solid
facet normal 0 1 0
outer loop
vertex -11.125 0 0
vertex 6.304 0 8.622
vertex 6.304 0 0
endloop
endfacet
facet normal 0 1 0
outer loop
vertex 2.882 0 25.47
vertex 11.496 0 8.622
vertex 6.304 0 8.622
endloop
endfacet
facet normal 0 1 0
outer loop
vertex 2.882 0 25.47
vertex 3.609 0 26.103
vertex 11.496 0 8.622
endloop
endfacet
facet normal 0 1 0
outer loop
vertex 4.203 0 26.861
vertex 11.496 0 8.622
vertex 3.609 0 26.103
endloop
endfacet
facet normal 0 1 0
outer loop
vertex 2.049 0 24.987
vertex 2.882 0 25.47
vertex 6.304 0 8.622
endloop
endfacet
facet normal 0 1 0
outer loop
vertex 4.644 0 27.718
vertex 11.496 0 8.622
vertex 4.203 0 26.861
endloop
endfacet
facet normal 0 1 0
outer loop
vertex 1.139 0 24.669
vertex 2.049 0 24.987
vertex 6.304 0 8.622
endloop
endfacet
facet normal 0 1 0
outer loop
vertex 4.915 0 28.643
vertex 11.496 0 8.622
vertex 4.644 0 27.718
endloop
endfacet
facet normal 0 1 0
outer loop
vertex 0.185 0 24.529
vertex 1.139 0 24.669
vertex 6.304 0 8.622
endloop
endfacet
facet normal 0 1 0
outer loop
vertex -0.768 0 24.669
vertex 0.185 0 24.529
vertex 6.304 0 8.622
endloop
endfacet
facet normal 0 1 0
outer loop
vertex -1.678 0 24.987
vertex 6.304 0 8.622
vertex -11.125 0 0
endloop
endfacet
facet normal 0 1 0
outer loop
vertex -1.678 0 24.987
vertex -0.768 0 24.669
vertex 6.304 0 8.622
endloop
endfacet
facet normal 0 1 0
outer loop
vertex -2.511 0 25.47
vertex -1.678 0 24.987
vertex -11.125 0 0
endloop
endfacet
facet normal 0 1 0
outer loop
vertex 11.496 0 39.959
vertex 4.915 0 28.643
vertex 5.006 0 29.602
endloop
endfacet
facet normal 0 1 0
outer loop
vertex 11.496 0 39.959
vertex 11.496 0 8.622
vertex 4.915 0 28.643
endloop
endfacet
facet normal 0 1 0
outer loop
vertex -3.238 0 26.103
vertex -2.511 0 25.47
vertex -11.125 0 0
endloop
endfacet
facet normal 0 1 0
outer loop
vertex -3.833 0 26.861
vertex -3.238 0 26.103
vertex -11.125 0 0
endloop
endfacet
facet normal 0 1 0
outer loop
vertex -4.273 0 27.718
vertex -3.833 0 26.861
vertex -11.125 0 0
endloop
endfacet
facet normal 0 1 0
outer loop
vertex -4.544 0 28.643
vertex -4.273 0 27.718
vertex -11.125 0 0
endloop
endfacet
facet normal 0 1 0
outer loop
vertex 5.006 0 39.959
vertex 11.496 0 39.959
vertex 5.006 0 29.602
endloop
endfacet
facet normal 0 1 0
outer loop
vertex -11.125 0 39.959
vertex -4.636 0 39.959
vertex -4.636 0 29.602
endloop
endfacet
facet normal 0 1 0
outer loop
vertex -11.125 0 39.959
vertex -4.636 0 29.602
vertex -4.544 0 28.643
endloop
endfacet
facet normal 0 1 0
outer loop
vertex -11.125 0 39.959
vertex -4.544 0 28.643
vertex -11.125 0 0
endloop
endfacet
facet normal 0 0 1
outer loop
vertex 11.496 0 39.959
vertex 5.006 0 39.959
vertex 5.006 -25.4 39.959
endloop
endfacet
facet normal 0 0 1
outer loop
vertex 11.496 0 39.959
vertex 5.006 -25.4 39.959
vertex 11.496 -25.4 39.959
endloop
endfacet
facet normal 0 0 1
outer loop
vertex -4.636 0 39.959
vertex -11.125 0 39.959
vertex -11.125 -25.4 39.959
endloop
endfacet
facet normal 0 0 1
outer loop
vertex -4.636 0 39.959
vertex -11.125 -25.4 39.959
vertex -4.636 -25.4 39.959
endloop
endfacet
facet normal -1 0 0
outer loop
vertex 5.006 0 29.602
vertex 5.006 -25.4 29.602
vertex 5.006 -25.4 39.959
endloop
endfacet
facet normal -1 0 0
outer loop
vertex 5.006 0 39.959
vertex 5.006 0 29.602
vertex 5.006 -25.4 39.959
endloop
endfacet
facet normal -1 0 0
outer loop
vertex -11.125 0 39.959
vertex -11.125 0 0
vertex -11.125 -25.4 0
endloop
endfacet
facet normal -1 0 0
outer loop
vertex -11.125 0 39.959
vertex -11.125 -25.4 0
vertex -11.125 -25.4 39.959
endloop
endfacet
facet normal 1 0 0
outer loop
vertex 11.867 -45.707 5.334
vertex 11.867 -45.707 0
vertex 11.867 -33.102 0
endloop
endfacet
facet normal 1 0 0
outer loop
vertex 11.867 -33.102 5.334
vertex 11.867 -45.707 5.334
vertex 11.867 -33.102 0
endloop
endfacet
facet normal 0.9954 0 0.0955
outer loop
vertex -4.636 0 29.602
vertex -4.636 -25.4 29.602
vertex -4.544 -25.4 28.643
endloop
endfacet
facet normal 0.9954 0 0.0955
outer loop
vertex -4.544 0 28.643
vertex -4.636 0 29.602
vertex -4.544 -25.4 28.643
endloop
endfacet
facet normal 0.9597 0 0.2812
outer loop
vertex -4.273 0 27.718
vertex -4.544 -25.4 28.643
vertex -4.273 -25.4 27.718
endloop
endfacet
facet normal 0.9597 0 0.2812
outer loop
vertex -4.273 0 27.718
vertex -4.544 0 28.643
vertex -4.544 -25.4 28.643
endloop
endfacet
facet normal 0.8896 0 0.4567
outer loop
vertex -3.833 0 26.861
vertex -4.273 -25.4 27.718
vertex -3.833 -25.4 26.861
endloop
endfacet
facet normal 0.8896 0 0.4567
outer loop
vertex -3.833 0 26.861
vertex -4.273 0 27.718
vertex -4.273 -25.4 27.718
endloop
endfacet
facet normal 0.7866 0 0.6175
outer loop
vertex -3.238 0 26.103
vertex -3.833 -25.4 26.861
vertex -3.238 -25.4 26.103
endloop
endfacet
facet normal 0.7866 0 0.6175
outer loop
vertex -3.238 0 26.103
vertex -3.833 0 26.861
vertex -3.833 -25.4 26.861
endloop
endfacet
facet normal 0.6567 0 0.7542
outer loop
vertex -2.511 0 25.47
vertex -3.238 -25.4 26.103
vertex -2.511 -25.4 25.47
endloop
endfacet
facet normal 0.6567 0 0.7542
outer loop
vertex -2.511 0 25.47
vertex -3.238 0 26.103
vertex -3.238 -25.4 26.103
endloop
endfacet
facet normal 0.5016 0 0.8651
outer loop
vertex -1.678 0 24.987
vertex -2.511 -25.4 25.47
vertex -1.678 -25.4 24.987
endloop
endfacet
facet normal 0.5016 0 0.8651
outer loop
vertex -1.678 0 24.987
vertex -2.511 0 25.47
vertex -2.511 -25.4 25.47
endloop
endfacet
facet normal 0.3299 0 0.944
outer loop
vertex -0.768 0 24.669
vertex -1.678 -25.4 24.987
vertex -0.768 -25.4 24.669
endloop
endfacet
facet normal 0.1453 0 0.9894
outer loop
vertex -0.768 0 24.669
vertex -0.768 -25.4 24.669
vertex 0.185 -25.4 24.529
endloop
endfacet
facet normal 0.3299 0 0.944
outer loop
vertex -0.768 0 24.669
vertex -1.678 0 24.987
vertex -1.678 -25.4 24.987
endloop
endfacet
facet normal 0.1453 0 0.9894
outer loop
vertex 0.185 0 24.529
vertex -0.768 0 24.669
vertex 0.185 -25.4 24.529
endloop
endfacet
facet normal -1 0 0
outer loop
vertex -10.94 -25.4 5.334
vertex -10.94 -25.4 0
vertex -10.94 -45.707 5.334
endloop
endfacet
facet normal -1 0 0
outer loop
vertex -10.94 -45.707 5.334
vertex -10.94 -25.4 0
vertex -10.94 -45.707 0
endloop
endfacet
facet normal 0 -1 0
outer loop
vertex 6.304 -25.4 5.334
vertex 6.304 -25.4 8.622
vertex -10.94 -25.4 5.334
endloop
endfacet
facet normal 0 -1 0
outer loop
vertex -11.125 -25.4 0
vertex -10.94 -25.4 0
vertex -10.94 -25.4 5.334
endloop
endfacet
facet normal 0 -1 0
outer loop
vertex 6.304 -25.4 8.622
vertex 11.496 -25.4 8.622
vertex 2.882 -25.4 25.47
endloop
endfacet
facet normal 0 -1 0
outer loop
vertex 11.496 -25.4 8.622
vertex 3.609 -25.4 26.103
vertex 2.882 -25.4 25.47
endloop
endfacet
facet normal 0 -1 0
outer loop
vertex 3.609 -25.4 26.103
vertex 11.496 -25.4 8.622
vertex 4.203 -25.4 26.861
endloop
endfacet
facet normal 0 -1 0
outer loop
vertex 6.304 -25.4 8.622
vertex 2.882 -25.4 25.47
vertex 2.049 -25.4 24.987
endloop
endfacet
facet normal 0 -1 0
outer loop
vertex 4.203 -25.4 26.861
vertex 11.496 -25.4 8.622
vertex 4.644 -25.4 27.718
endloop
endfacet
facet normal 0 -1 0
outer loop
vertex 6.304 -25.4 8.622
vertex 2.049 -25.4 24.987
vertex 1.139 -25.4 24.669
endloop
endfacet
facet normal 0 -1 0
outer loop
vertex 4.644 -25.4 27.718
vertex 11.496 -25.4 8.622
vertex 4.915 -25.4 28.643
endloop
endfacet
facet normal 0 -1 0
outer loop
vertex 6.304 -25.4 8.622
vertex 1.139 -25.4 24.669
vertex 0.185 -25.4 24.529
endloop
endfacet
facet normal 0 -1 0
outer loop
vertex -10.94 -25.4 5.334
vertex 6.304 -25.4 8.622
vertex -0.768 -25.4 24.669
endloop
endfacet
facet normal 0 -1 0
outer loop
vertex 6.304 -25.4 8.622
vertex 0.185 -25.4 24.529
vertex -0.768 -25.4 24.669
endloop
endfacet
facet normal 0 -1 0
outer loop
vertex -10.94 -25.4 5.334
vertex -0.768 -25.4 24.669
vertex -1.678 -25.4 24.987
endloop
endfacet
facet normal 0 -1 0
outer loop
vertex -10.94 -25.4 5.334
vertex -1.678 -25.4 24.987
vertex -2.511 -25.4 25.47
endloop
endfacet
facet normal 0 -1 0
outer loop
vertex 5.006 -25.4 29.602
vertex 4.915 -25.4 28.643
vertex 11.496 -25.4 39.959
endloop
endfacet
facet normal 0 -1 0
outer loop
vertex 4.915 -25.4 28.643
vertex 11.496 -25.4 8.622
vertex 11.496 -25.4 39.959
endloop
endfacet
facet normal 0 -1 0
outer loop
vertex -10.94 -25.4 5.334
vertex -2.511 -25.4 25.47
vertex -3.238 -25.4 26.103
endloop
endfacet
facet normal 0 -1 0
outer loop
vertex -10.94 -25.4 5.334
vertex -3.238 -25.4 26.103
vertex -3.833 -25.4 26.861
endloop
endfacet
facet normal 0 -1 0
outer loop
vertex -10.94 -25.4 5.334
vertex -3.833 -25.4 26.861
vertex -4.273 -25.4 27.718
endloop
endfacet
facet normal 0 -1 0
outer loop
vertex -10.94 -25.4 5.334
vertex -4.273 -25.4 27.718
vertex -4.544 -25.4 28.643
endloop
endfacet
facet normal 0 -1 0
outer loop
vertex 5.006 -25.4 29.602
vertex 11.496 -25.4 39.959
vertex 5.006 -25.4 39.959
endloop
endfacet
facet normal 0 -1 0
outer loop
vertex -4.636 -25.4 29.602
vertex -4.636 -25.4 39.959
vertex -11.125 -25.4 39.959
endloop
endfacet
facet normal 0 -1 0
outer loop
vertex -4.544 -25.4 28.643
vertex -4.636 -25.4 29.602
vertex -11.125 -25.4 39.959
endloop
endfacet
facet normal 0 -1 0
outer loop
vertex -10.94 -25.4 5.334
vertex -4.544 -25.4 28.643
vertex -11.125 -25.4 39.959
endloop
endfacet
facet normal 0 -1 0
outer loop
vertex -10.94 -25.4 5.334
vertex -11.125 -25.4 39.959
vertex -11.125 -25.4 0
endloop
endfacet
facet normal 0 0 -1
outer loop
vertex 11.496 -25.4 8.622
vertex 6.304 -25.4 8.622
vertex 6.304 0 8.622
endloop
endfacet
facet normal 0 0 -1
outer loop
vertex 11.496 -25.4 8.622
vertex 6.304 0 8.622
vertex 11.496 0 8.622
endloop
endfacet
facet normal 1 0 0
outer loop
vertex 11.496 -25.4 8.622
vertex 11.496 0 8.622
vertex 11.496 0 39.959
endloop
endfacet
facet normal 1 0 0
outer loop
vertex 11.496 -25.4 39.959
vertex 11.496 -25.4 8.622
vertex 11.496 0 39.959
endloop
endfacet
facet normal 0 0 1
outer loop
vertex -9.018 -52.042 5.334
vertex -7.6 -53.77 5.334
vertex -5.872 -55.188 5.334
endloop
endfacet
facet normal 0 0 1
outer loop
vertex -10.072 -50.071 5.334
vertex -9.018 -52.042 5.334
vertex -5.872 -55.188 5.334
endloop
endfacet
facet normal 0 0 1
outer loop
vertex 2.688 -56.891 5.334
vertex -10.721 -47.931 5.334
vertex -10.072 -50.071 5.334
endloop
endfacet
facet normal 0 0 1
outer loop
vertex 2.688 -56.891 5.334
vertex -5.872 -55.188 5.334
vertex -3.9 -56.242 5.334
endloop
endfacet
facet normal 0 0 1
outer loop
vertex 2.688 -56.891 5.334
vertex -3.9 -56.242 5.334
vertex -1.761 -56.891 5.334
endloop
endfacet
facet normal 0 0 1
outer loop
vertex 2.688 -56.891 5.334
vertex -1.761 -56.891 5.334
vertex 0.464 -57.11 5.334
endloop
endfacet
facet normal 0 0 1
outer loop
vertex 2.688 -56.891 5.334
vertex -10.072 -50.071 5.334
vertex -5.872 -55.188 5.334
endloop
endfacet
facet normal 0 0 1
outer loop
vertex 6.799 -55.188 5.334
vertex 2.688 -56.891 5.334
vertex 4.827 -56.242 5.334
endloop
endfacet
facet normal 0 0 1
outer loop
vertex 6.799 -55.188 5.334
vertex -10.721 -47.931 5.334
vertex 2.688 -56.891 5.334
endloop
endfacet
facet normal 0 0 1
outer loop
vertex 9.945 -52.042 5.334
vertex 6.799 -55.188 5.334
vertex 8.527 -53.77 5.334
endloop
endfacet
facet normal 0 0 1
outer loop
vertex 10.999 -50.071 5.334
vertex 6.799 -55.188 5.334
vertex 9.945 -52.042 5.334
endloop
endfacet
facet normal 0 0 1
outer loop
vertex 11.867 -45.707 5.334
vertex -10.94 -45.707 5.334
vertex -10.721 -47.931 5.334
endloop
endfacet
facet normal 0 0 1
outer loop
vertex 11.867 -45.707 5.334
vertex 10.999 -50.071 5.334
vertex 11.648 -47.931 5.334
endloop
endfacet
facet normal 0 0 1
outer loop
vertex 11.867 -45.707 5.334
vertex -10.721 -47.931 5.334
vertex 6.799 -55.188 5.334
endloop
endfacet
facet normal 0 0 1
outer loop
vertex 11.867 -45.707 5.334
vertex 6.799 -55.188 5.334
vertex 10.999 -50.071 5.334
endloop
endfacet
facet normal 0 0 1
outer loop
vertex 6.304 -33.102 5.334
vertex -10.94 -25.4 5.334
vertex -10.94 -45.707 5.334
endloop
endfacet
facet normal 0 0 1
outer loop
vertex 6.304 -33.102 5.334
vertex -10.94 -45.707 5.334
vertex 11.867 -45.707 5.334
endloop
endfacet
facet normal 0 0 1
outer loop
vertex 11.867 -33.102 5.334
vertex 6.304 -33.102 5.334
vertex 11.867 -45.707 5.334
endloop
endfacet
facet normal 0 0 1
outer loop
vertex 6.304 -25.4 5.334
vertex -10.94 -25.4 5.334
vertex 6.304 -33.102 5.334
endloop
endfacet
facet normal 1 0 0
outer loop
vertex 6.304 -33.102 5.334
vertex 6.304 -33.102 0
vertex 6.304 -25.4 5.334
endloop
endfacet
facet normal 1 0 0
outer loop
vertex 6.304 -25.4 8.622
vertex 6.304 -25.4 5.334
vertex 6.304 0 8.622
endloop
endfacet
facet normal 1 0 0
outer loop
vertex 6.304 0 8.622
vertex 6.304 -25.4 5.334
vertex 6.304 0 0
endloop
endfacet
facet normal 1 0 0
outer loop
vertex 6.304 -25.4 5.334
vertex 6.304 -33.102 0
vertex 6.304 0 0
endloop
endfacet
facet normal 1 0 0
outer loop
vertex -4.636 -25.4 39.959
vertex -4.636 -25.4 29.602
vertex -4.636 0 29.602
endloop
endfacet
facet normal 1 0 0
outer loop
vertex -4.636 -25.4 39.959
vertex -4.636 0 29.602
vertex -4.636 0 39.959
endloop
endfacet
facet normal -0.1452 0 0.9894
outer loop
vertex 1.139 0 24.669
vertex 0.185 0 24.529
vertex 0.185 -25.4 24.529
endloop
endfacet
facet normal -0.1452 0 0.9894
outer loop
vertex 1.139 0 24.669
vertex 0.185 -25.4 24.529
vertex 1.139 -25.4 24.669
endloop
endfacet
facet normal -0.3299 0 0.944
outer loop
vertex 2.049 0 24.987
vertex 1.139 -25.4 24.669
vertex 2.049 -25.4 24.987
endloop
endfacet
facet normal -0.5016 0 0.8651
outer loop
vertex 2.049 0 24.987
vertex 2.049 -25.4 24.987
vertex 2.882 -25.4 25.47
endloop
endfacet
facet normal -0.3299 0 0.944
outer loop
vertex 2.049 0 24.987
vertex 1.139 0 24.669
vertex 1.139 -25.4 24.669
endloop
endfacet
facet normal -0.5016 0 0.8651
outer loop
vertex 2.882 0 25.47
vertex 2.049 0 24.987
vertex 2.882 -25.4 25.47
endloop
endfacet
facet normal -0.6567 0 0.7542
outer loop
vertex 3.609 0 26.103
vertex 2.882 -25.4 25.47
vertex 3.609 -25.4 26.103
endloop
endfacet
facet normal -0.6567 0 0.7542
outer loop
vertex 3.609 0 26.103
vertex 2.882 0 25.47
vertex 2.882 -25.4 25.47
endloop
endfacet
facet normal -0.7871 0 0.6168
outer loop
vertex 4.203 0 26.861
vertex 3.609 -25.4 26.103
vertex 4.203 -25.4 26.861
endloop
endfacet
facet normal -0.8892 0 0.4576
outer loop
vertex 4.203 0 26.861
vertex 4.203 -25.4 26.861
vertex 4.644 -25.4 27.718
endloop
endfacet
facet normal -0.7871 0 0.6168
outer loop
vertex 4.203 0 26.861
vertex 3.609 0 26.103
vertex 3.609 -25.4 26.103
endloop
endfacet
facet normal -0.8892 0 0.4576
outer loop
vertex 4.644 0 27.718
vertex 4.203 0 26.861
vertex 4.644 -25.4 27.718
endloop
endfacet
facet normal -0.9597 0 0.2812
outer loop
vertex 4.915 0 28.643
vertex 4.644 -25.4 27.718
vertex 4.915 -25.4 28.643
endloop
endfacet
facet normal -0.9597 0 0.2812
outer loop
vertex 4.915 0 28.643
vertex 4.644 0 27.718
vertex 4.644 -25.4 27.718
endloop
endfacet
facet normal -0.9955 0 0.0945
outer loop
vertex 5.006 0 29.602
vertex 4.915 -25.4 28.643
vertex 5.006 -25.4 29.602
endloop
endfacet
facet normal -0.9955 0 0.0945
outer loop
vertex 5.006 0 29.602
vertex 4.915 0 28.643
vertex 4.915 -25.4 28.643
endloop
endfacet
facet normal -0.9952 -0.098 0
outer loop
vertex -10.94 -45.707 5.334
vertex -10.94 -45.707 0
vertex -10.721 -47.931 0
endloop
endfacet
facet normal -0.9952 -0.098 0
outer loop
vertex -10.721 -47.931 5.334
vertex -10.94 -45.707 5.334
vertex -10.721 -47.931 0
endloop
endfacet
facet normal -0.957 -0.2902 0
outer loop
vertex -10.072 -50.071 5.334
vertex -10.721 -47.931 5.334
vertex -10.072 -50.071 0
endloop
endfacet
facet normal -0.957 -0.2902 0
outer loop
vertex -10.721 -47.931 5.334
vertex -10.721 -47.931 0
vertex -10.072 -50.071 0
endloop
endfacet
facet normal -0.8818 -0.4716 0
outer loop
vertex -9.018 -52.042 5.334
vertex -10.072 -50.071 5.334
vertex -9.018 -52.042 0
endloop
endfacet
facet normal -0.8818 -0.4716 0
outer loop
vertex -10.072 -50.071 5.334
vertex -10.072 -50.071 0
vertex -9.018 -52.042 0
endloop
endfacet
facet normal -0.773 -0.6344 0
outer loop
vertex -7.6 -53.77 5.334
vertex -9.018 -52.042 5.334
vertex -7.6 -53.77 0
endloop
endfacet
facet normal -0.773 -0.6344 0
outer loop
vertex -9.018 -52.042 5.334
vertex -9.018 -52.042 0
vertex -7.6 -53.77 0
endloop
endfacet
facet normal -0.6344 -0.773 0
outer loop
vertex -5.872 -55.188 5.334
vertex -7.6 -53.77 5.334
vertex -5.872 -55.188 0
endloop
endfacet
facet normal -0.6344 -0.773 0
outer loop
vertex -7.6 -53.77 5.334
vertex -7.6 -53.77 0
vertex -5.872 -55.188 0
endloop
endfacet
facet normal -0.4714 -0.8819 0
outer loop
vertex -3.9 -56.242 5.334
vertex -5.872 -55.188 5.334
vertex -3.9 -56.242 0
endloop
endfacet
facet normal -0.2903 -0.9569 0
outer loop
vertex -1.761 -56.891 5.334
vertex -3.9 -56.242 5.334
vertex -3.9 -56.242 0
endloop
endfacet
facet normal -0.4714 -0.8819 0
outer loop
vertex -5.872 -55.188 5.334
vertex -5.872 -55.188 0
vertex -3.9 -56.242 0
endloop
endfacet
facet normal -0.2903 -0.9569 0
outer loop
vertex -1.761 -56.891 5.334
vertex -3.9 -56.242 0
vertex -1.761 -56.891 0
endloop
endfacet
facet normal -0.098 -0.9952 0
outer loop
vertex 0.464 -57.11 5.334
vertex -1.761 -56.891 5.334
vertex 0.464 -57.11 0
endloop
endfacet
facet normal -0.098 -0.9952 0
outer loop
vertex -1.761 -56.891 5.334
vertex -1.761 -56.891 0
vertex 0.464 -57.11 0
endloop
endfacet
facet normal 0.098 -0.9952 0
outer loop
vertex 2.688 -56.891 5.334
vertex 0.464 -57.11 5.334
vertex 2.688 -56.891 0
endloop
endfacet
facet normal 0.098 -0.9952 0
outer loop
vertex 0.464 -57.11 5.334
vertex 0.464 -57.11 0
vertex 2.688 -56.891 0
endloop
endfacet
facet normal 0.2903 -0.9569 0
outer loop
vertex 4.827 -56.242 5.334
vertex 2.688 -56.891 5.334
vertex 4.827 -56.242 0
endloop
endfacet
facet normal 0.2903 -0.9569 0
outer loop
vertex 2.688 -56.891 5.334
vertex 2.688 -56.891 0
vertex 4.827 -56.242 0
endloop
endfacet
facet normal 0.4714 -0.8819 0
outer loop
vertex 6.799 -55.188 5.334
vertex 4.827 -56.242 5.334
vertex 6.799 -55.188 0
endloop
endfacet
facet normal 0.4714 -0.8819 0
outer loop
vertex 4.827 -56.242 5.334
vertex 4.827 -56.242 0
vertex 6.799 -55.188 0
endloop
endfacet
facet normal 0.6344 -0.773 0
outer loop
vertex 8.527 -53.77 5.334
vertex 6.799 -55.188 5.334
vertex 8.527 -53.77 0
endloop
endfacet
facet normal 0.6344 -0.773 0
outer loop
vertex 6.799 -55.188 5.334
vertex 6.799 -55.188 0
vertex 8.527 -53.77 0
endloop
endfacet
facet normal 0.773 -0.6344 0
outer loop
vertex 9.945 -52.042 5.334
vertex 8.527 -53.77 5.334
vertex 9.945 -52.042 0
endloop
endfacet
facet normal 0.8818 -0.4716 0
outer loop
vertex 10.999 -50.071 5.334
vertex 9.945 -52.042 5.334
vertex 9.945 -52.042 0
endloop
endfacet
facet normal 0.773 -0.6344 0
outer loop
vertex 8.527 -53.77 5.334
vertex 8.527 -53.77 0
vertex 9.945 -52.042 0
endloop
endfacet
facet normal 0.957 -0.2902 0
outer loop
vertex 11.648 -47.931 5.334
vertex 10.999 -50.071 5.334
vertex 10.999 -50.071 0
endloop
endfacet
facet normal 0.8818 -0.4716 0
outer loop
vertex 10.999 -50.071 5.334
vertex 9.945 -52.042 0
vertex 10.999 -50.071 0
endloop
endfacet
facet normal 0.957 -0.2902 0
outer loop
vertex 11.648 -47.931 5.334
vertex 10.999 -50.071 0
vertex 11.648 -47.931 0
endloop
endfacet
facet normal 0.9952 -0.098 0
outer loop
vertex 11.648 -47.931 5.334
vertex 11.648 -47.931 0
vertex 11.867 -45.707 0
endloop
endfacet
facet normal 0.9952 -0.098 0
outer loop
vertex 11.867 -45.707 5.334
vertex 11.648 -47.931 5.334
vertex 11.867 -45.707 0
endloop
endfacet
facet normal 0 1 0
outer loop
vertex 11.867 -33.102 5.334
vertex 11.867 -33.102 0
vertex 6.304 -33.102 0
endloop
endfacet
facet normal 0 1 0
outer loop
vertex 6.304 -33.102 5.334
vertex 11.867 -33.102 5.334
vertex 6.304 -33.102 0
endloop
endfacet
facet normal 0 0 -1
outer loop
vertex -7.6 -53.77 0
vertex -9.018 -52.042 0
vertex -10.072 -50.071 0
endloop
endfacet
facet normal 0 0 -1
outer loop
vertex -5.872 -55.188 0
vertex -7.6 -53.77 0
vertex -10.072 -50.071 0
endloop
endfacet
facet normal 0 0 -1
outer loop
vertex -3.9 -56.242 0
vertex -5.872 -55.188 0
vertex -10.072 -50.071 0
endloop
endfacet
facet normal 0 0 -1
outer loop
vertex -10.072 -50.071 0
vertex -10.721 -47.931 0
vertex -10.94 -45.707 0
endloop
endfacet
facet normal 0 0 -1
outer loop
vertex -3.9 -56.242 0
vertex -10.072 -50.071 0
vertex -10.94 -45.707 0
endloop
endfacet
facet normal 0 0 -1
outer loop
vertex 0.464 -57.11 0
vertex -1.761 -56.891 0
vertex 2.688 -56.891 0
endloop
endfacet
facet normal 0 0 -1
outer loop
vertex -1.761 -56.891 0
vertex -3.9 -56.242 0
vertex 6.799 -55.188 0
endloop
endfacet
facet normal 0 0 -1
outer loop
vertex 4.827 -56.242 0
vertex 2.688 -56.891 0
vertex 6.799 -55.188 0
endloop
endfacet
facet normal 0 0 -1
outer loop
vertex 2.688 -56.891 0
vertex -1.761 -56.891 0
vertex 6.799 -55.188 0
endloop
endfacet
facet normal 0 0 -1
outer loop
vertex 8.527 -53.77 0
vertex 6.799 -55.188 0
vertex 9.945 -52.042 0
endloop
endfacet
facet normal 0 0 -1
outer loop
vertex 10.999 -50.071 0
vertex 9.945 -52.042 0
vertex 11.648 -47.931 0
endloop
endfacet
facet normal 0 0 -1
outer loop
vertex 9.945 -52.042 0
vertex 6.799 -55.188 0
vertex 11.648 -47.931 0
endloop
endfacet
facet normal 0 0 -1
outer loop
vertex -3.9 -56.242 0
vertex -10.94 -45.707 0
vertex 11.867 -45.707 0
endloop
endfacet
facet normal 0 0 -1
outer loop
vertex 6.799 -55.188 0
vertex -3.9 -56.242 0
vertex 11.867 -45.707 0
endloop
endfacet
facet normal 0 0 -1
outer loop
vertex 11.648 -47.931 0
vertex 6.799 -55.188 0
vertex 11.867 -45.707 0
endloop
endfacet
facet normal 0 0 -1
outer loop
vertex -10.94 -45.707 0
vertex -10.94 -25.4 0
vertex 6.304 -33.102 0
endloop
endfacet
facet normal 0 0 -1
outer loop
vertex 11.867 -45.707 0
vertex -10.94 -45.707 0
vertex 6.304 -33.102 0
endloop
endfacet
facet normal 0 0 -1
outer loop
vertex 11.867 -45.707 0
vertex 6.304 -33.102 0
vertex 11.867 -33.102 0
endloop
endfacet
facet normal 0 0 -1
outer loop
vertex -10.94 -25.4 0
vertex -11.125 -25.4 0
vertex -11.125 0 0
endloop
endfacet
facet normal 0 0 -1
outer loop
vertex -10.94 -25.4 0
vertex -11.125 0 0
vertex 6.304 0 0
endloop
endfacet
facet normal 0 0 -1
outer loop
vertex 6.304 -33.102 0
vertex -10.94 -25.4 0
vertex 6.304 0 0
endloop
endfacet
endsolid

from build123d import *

# Parameters (mm, degrees)
F0_W        = 22.621599026
F0_H        = 39.9586446583
F1_DEPTH    = 25.4
F2_W        = 9.6419928595
F2_H        = 15.4364593327
F3_DEPTH    = 25.401
F4_T1_DEPTH = 25.4
F5_W        = 5.1918416284
F5_H        = 8.622167632
F6_DEPTH    = 25.401
F8_DEPTH    = 0.254
F9_DEPTH    = 5.08


# Not quite as in the source:
# - a fillet or chamfer that OpenCascade refuses, or shapes differently, is made with other operations: its cross-section is extruded or revolved along the edge and cut away or added


with BuildPart() as f1:
    # F0 (on Front) → F1 (new body)
    with BuildSketch(Plane.XZ):
        with Locations((0.185423065, 19.9793223292)):
            Rectangle(F0_W, F0_H)
    extrude(amount=F1_DEPTH)

    # F2 (on face) → F3 (cut, through all)
    with BuildSketch(Plane.XZ.offset(25.4)):
        with Locations((0.1854221337, 32.240414992)):
            Rectangle(F2_W, F2_H)
    extrude(amount=-F3_DEPTH, mode=Mode.SUBTRACT)

    # F4: fillet of radius 5.08 on 2 edges, made by hand

    # F4_s2 → F4_t1 (join)
    with BuildSketch(Plane.XZ):
        with BuildLine():
            ThreePointArc((-4.6355742961, 29.6021853256), (-3.1476767445, 26.0100828772), (0.4444257039, 24.5221853256))
            Line((0.4444257039, 24.5221853256), (-4.6355742961, 24.5221853256))
            Line((-4.6355742961, 24.5221853256), (-4.6355742961, 29.6021853256))
        make_face()
        with BuildLine():
            ThreePointArc((-0.0735814366, 24.5221853256), (3.5185210119, 26.0100828772), (5.0064185634, 29.6021853256))
            Line((5.0064185634, 29.6021853256), (5.0064185634, 24.5221853256))
            Line((5.0064185634, 24.5221853256), (-0.0735814366, 24.5221853256))
        make_face()
    extrude(amount=F4_T1_DEPTH)

    # F5 (on face) → F6 (cut, through all)
    with BuildSketch(Plane.XZ.offset(25.4)):
        with Locations((8.9003017638, 4.311083816)):
            Rectangle(F5_W, F5_H)
    extrude(amount=-F6_DEPTH, mode=Mode.SUBTRACT)

    # F7 (on Top) → F8 (join)
    with BuildSketch(Plane.XY):
        with BuildLine():
            Line((6.3043809496, 0), (-10.9399538487, 0))
            Line((-10.9399538487, 0), (-10.9399538487, -45.7067526877))
            ThreePointArc((-10.9399538487, -45.7067526877), (0.463556964, -57.1102635004), (11.8670677766, -45.7067526877))
            Line((11.8670677766, -45.7067526877), (11.8670677766, -33.1019833684))
            Line((11.8670677766, -33.1019833684), (6.3043809496, -33.1019833684))
            Line((6.3043809496, -33.1019833684), (6.3043809496, -25.4))
            Line((6.3043809496, -25.4), (6.3043809496, 0))
        make_face()
    extrude(amount=F8_DEPTH)

    # F9 (add): a face of the model
    f9_faces = [f1.faces().sort_by_distance(p)[0] for p in [
        (-0.1279092973, -40.8893319154, 0.254),
    ]]
    extrude(f9_faces, amount=F9_DEPTH)


solid = f1.part
